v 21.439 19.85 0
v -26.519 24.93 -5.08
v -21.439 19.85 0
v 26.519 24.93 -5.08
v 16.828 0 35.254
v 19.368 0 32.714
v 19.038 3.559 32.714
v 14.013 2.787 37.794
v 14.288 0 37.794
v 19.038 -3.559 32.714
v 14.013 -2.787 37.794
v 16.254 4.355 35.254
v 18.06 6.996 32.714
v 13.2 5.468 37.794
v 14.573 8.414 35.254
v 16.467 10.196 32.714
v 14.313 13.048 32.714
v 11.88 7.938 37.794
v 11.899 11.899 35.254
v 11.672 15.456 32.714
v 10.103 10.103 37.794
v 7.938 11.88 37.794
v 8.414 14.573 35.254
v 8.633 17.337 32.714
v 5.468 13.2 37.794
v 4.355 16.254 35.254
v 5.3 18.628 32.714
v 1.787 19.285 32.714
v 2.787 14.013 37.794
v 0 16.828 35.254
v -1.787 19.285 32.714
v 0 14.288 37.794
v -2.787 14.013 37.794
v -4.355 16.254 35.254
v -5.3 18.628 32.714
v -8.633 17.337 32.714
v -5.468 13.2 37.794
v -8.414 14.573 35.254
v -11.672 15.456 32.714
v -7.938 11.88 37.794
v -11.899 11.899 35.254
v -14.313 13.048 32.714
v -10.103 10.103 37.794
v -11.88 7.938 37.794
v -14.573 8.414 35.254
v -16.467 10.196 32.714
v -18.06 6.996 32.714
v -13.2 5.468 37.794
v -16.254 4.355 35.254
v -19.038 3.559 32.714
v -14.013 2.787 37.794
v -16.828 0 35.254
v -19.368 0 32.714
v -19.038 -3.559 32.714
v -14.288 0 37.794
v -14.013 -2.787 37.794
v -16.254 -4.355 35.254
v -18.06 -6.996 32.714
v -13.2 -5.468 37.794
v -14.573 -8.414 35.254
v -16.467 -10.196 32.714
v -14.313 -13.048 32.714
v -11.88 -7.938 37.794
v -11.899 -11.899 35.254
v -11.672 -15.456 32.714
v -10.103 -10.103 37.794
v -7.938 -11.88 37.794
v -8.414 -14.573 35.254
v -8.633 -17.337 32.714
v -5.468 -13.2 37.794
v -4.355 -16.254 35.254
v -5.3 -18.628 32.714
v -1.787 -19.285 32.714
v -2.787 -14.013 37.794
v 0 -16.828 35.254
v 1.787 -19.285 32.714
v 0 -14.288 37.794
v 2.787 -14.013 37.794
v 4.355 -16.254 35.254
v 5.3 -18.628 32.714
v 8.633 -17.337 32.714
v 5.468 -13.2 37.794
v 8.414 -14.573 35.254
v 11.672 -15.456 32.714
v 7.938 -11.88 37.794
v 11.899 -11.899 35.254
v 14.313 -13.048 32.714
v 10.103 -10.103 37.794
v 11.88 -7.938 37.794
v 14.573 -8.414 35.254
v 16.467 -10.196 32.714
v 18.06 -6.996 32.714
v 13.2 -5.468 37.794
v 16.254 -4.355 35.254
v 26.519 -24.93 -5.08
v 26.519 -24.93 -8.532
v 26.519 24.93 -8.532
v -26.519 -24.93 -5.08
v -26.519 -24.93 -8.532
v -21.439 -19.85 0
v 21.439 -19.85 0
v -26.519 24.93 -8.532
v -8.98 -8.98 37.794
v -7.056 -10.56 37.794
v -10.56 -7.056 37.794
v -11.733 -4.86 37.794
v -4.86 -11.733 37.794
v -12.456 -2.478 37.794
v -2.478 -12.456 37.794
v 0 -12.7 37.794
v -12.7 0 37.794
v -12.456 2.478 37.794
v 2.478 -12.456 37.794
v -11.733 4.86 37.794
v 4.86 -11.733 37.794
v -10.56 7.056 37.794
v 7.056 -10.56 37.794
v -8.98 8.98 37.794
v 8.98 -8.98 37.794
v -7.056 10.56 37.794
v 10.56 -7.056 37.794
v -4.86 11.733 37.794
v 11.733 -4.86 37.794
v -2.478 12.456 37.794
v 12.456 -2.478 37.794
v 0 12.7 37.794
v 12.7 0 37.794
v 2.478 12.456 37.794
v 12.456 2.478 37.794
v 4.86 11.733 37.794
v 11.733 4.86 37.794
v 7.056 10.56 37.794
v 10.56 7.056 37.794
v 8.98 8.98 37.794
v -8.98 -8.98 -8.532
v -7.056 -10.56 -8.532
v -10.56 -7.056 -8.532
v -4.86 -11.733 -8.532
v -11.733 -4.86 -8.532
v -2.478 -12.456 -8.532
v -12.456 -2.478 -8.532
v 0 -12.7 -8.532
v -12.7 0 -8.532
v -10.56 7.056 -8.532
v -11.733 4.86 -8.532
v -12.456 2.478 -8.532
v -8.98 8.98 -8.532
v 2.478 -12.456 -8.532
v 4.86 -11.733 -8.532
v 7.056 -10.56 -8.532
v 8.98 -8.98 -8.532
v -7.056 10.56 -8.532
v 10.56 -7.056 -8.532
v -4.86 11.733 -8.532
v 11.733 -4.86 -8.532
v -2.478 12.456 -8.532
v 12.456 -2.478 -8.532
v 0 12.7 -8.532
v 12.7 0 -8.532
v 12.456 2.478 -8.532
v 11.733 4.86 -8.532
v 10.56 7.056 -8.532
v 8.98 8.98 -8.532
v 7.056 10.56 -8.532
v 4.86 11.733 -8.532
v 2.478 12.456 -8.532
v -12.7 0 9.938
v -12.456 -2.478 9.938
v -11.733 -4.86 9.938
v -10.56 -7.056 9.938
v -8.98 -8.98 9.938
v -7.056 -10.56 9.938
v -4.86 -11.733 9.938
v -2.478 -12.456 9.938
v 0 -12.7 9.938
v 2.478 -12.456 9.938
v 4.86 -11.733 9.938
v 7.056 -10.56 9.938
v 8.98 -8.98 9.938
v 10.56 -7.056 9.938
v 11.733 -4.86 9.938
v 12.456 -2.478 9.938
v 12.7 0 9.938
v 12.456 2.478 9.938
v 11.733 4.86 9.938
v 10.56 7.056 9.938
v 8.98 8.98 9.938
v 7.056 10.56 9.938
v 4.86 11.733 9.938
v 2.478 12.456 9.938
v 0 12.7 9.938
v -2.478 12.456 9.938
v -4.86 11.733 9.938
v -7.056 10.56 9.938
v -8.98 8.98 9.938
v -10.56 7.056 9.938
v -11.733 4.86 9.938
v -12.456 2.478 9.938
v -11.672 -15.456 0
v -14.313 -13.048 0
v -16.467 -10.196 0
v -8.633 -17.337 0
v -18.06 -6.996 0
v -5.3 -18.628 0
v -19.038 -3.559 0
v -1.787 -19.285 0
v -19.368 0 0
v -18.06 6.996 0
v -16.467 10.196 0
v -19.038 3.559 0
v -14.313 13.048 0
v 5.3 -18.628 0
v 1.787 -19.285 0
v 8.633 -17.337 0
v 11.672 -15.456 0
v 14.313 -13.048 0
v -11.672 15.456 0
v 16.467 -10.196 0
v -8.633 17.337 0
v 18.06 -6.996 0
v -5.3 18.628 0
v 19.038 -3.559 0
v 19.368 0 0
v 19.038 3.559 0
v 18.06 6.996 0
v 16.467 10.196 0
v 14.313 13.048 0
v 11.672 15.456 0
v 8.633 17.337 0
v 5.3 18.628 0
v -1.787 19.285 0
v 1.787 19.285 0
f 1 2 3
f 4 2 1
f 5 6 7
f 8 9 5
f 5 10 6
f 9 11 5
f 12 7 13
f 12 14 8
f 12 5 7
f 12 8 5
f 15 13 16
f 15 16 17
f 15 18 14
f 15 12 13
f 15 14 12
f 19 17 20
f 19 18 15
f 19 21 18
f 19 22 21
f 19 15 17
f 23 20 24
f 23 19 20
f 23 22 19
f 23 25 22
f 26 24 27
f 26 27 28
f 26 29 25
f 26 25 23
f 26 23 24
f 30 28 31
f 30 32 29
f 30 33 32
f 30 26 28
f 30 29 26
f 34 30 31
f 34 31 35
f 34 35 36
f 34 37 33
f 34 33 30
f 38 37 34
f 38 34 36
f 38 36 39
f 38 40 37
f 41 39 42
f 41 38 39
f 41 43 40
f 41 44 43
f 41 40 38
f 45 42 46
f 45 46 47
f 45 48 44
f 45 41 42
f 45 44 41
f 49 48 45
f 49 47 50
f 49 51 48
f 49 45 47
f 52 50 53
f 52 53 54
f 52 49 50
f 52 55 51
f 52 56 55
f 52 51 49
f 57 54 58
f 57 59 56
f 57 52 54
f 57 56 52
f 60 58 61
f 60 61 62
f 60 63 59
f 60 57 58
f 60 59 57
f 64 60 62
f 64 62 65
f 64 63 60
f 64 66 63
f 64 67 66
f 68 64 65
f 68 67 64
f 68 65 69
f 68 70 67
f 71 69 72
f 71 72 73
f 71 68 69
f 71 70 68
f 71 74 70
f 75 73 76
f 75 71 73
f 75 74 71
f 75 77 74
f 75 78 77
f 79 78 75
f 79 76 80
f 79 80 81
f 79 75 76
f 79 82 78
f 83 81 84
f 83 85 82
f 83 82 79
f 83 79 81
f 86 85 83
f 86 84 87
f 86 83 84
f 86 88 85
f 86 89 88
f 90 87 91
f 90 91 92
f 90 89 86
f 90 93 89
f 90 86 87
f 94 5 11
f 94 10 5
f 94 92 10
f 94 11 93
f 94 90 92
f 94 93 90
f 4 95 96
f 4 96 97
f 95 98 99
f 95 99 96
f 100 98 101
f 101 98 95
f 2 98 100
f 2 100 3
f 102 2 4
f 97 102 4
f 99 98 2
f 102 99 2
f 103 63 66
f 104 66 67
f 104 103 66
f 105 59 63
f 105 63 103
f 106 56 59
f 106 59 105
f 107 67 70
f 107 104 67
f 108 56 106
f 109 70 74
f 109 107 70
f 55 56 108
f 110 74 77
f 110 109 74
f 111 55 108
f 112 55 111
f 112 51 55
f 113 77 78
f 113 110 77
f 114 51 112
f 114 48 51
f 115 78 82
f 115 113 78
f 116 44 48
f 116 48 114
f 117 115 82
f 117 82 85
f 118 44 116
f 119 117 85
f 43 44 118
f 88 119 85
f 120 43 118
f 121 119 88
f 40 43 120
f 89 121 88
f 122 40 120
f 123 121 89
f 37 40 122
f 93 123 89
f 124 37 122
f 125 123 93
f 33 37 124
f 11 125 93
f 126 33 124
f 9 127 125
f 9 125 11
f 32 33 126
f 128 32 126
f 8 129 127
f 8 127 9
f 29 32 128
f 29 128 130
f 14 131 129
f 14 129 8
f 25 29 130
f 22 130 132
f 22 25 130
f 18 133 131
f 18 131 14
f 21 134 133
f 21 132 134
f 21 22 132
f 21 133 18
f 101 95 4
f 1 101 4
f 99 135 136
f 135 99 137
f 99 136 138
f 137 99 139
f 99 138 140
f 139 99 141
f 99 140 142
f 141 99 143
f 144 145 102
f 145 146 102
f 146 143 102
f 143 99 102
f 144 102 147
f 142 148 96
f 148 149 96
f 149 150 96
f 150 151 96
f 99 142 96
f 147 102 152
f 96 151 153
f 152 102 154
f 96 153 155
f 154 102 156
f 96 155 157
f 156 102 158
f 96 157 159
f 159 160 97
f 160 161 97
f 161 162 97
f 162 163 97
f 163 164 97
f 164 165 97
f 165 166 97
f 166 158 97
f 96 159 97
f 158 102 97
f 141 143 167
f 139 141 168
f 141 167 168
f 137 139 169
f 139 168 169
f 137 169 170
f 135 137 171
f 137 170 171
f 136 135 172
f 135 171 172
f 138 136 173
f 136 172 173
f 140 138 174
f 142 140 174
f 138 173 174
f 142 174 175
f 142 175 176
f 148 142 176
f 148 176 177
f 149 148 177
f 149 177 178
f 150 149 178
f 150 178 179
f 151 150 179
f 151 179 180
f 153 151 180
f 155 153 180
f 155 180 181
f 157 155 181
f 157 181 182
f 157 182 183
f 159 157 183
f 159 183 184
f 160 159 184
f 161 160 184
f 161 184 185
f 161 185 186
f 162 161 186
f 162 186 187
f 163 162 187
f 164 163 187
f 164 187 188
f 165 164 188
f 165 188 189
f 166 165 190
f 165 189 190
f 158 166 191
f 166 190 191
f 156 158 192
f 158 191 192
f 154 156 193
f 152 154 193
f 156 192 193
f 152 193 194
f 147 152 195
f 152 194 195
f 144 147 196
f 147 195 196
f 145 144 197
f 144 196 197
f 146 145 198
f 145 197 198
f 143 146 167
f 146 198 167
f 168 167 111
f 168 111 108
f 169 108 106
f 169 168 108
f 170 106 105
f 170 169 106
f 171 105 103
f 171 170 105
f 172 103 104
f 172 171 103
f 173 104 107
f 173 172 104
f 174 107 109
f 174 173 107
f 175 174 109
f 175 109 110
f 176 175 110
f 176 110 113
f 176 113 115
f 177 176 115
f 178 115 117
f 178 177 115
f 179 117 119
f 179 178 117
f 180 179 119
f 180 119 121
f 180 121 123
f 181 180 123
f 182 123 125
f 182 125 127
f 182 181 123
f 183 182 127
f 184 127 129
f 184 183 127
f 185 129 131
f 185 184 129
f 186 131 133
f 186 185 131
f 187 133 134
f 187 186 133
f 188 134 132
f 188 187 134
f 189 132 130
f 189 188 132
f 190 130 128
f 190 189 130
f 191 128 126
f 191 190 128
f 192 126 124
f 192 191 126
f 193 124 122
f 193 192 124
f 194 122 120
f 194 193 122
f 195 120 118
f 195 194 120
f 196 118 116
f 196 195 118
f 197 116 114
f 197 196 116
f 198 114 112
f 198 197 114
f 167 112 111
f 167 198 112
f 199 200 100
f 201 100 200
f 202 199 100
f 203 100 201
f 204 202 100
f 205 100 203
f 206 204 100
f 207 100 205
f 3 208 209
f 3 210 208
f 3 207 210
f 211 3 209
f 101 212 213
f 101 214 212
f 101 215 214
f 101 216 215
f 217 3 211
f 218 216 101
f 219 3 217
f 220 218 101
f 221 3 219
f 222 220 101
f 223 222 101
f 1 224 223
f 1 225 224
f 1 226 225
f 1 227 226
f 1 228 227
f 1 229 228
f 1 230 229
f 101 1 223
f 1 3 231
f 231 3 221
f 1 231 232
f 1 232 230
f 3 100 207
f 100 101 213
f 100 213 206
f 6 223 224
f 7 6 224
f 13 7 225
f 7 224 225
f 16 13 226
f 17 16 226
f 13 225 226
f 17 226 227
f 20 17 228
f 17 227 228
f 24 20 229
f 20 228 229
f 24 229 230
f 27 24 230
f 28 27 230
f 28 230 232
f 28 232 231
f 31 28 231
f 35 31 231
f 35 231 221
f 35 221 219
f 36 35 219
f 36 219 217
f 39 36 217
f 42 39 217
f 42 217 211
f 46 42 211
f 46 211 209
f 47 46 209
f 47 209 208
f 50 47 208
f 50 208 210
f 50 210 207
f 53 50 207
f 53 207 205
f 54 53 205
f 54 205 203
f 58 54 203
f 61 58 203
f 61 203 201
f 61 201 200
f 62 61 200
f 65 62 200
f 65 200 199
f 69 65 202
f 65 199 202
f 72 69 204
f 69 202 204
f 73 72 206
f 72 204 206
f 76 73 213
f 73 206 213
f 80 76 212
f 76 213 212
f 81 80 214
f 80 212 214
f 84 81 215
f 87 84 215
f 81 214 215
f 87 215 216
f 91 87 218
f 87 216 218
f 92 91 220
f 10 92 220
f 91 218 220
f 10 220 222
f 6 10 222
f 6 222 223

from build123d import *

# Parameters (mm, degrees)
F0_R     = 19.3675985609
F1_DEPTH = 9.9377613515
F2_W     = 53.0373156071
F2_H     = 49.859970808
F3_DEPTH = 8.5315406322
F5_D     = 25.4
F6_DEPTH = 27.8559215367
F7_SIZE  = 5.08
F8_SIZE  = 5.08


with BuildPart() as f1:
    # F0 (on Top) → F1 (new body)
    with BuildSketch(Plane.XY):
        Circle(F0_R)
    extrude(amount=F1_DEPTH)

    # F2 (on Top) → F3 (join)
    with BuildSketch(Plane.XY):
        Rectangle(F2_W, F2_H)
    extrude(amount=-F3_DEPTH)

    # F5 (through all)
    with Locations(Plane(origin=(0, 0, -8.5315406322), x_dir=(1, 0, 0), z_dir=(0, 0, -1))):
        with Locations((0, 0)):
            Hole(F5_D / 2)

    # F6 (add): a face of the model
    f6_faces = [f1.faces().sort_by_distance(p)[0] for p in [
        (-18.8198001498, 0, 9.9377613515),
    ]]
    extrude(f6_faces, amount=F6_DEPTH)

    # F7
    f7_edges = [f1.edges().sort_by_distance(p)[0] for p in [
        (-19.367599, 0, 37.793683),
    ]]
    chamfer(f7_edges, length=F7_SIZE)

    # F8
    f8_edges = [f1.edges().sort_by_distance(p)[0] for p in [
        (26.518658, 0, 0),
        (0, -24.929985, 0),
        (-26.518658, 0, 0),
        (0, 24.929985, 0),
    ]]
    chamfer(f8_edges, length=F8_SIZE)


solid = f1.part
